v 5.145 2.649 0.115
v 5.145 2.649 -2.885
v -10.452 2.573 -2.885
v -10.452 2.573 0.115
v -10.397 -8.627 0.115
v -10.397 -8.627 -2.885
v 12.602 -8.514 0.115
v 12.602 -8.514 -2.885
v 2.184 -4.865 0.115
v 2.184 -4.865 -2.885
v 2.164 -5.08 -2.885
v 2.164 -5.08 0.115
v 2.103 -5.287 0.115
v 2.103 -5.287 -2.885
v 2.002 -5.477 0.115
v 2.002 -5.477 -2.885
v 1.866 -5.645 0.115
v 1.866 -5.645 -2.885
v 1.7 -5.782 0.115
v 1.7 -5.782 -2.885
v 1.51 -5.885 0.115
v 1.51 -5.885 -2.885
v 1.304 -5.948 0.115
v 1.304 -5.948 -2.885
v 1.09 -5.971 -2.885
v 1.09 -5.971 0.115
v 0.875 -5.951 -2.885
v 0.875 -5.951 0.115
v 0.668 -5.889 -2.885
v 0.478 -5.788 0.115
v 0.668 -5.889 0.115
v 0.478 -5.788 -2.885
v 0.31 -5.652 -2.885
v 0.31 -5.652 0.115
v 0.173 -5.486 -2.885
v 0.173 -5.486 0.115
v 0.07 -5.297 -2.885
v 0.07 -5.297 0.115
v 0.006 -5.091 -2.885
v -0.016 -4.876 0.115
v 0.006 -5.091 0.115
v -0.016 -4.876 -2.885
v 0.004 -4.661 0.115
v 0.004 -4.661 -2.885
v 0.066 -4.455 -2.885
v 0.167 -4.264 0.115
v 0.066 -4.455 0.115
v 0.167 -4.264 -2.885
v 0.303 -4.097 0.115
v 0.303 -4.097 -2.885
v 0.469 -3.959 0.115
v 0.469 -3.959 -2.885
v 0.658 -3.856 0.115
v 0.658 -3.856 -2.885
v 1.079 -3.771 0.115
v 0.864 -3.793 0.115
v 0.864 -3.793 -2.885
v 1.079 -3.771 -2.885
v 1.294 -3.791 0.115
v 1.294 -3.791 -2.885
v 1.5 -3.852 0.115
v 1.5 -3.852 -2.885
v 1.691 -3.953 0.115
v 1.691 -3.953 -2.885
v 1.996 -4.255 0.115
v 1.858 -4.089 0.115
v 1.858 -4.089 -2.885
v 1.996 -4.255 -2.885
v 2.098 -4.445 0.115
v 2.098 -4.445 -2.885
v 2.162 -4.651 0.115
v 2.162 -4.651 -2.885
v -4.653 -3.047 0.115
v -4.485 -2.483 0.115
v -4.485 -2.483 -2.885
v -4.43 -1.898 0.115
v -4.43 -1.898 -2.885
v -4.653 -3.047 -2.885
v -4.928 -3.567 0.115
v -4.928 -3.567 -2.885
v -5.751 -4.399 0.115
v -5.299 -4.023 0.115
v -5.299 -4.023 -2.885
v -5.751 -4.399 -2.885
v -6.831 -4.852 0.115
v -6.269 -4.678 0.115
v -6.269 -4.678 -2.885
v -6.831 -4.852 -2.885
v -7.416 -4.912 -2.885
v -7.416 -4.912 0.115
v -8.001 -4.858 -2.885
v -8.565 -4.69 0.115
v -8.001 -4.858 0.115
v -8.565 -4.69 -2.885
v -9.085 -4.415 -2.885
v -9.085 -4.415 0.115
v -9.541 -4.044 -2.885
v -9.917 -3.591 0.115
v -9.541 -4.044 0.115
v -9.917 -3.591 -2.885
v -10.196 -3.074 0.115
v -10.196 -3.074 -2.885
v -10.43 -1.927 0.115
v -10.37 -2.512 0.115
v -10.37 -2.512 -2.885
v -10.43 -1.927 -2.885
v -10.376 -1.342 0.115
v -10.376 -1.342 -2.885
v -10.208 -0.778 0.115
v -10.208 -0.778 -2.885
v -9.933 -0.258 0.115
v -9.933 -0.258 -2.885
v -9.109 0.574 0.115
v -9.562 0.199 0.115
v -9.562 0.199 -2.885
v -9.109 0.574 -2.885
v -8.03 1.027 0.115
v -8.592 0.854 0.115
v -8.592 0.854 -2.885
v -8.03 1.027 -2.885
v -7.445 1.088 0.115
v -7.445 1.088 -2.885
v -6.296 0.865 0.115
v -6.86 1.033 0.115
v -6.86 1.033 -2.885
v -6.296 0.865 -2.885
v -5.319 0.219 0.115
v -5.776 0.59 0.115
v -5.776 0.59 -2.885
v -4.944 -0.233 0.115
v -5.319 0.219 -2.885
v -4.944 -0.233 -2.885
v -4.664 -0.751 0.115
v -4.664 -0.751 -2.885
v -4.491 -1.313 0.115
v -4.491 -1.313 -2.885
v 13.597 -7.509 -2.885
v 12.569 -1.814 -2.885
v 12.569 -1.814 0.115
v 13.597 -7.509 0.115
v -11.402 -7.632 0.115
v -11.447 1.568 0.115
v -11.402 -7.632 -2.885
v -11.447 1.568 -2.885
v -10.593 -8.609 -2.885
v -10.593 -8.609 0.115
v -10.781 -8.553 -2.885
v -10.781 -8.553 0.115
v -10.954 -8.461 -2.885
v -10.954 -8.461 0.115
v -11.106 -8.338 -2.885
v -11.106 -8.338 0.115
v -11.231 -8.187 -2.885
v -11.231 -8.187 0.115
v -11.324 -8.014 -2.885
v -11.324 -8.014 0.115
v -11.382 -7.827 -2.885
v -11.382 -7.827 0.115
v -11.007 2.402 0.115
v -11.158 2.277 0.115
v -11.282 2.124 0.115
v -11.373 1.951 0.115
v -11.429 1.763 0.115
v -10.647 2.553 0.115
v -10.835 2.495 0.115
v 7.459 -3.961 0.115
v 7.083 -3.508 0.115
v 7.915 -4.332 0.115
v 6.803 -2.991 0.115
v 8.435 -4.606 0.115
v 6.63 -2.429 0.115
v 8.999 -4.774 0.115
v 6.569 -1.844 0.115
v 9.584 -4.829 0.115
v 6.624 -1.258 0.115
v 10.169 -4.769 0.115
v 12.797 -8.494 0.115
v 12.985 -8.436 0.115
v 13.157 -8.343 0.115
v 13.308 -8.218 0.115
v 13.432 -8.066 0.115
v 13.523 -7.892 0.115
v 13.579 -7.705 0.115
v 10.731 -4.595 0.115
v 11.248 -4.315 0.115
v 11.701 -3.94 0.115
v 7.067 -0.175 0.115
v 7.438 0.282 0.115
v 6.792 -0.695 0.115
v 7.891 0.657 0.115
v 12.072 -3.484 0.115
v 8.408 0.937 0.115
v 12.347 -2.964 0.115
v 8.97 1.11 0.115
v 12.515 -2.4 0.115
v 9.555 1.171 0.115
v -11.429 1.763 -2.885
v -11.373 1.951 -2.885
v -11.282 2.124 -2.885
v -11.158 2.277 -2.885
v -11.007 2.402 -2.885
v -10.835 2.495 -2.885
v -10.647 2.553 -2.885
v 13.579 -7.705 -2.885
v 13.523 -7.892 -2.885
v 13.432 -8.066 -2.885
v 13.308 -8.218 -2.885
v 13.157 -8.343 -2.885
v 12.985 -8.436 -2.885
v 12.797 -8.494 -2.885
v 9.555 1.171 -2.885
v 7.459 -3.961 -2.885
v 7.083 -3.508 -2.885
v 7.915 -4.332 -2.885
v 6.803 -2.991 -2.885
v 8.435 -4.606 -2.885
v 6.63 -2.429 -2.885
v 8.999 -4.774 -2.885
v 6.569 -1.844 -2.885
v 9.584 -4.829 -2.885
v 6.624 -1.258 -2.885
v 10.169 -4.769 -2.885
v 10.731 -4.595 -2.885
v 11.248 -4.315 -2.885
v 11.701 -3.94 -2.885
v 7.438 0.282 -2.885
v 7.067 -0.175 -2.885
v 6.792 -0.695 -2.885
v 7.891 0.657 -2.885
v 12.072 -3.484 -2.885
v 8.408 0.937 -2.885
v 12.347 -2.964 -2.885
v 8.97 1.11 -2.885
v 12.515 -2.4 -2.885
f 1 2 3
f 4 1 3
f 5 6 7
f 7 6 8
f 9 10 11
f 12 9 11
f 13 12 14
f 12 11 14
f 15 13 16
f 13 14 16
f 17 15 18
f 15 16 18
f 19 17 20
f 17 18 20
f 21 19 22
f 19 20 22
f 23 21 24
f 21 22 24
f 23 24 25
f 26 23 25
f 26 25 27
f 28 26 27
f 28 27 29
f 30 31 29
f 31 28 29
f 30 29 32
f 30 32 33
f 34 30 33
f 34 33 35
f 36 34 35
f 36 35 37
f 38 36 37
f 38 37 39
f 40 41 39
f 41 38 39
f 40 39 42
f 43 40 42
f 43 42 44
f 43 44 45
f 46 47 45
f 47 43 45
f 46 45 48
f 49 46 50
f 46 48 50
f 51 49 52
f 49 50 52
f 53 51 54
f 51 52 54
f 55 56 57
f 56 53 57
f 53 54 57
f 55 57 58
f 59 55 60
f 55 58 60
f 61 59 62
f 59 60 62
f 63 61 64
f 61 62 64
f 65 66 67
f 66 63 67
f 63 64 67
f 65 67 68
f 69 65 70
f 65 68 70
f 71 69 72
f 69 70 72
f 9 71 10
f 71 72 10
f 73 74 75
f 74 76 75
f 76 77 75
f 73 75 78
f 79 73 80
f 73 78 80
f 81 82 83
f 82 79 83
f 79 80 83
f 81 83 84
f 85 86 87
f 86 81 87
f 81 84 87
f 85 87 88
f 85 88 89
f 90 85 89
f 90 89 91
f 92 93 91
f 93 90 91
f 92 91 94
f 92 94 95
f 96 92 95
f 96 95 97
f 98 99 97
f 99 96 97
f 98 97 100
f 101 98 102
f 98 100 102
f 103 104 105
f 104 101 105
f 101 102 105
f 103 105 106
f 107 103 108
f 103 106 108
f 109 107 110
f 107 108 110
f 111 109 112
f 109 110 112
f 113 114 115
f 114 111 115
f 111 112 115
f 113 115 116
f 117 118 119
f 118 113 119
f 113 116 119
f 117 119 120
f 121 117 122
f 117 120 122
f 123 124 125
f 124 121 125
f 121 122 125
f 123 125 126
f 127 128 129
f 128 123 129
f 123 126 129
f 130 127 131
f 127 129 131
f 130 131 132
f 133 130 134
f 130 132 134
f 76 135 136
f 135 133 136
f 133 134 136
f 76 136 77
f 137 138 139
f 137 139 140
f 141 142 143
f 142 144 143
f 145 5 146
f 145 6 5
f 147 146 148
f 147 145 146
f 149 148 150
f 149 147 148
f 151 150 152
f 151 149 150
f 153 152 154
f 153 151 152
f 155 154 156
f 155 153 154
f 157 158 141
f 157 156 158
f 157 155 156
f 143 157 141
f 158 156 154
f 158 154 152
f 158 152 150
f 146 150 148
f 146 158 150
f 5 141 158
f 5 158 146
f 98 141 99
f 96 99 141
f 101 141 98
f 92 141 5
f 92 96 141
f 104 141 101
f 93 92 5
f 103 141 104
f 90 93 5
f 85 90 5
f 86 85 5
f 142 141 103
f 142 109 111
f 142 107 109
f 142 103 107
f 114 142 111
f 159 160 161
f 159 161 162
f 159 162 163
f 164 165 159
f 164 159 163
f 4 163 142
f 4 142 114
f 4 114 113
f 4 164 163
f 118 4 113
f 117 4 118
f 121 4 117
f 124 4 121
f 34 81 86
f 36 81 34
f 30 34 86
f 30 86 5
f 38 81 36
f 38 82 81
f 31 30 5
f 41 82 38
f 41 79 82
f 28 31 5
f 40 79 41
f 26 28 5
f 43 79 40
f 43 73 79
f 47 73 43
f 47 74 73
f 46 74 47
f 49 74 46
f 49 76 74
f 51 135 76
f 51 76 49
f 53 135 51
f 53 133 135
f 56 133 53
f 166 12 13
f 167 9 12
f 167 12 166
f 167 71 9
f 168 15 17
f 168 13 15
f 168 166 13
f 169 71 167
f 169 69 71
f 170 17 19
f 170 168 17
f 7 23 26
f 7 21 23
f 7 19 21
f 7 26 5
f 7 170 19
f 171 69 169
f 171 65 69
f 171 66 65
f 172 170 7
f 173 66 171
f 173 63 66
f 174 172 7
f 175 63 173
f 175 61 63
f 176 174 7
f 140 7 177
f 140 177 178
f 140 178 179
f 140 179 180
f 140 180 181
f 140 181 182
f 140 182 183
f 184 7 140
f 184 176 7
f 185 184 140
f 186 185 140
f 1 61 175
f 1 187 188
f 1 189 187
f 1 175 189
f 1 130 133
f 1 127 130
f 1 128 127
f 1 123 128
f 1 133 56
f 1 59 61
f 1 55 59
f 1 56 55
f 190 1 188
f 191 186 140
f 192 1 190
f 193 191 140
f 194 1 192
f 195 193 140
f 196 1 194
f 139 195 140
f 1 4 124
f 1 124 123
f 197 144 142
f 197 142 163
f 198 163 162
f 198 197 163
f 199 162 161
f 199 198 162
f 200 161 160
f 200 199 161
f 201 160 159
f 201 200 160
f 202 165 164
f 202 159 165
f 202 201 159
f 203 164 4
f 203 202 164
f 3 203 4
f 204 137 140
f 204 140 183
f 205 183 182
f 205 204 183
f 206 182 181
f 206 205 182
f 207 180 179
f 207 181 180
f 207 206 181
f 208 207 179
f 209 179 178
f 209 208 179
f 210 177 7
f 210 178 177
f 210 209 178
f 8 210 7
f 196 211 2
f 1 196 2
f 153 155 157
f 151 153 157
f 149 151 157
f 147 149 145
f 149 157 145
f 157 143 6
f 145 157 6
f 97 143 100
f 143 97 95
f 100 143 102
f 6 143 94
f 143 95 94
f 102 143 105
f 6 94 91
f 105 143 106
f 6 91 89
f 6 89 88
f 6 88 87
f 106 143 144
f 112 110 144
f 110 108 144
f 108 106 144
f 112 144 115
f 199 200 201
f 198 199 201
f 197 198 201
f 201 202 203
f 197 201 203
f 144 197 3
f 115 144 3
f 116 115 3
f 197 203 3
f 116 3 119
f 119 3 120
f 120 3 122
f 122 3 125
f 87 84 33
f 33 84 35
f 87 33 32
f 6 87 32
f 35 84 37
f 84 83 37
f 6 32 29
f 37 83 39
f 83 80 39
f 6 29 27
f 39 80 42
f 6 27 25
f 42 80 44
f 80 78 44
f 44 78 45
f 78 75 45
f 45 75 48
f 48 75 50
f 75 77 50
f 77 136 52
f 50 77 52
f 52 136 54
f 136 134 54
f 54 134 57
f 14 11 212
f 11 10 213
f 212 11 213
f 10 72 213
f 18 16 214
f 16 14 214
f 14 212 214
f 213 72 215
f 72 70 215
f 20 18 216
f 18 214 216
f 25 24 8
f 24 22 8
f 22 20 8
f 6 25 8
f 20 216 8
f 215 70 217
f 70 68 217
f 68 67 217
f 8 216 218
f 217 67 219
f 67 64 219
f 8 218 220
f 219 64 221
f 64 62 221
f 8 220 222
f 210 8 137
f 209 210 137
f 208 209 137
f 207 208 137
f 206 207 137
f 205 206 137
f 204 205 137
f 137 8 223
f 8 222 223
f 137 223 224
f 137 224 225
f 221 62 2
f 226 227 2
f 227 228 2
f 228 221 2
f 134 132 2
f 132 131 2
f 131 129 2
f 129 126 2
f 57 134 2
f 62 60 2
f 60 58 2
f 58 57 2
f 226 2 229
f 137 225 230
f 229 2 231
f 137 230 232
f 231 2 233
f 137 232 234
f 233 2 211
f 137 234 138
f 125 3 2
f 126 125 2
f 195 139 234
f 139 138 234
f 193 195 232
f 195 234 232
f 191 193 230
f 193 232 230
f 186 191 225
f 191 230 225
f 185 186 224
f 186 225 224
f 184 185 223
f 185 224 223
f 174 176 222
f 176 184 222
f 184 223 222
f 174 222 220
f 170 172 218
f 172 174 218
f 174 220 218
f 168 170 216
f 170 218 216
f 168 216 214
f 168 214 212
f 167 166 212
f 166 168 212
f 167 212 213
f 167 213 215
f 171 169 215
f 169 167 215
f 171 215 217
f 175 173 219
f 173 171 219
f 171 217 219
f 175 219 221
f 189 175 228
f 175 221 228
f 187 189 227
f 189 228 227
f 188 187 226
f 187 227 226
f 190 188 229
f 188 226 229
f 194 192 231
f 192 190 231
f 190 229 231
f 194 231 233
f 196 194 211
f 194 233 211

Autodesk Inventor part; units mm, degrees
ref_plane "YZ Plane" through (0, 0, 0) normal (1, 0, 0) x (0, 1, 0)
ref_plane "XZ Plane" through (0, 0, 0) normal (0, 1, 0) x (-1, 0, 0)
ref_plane "XY Plane" through (0, 0, 0) normal (0, 0, 1) x (1, 0, 0)
ref_plane "Work Plane1" through (1.0737, -2.7207, -1.3848) normal (0, 0, 1) x (1, 0.0049, 0)
sketch "Sketch1" plane through (1.0737, -2.7207, -1.3848) normal (0, 0, 1) x (1, 0.0049, 0)
  line L0 (-12.5, -4.85) -> (-12.5, 4.35) projected
  line L1 (12.5, 4.35) -> (12.5, -4.85) projected
  line L2 (11.5, -5.85) -> (-11.5, -5.85) projected
  circle A0 centre (8.5, 0.85) radius 3 projected
  circle A1 centre (-8.5, 0.85) radius 3 projected
  circle A2 centre (0, -2.15) radius 1.1
  line L3 (4.0694, -5.85) -> (-4.0694, -5.85)
  circle A3 centre (0, -2.15) radius 1.1 projected
  line L4 (-11.5, 5.35) -> (11.5, 5.35) projected
  arc A4 (-12.5, -4.85) -> (-11.5, -5.85) centre (-11.5, -4.85) ccw projected
  arc A5 (-11.5, 5.35) -> (-12.5, 4.35) centre (-11.5, 4.35) ccw projected
  arc A6 (12.5, 4.35) -> (11.5, 5.35) centre (11.5, 4.35) ccw projected
  arc A7 (11.5, -5.85) -> (12.5, -4.85) centre (11.5, -4.85) ccw projected
  point P0 (-1.0602, 2.726)
  dimension "d0" = 2.2
extrude "Extrusion1" add sketch "Sketch1" along normal mid plane 4
sketch "Sketch2" plane through (1.0737, -2.7207, 0.6152) normal (0, 0, 1) x (1, 0.0049, 0)
  line L0 (-12.5, 4.35) -> (-12.5, -4.85) projected
  line L1 (-11.5, -5.85) -> (11.5, -5.85) projected
  line L2 (12.5, -4.85) -> (12.5, 4.35) projected
  circle A0 centre (8.5, 0.85) radius 3 projected
  circle A1 centre (-8.5, 0.85) radius 3 projected
  line L3 (11.5, 0.85) -> (12.5, 0.85)
  line L4 (12.5, -4.85) -> (12.5, 4.35) projected
  circle A2 centre (8.5, 0.85) radius 3 projected
  line L5 (8.5, 3.85) -> (0.045, 5.85)
  line L6 (12.5, 5.85) -> (-12.5, 5.85) projected
  circle A3 centre (0, -2.15) radius 1.1 projected
  line L7 (11.5, 5.35) -> (-11.5, 5.35) projected
  arc A4 (-12.5, -4.85) -> (-11.5, -5.85) centre (-11.5, -4.85) ccw projected
  arc A5 (11.5, -5.85) -> (12.5, -4.85) centre (11.5, -4.85) ccw projected
  arc A6 (12.5, 4.35) -> (11.5, 5.35) centre (11.5, 4.35) ccw projected
  arc A7 (-11.5, 5.35) -> (-12.5, 4.35) centre (-11.5, 4.35) ccw projected
  point P0 (-1.0602, 2.726)
  point P1 (-12.5, 5.85)
  point P2 (8.5, 3.85)
  point P3 (12.5, 0.85)
extrude "Extrusion2" [suppressed]
sketch "Sketch3" plane through (1.0737, -2.7207, 0.6152) normal (0, 0, 1) x (1, 0.0049, 0)
  line L0 (-12.5, 4.35) -> (-12.5, -4.85) projected
  line L1 (-11.5, -5.85) -> (11.5, -5.85) projected
  line L2 (12.5, -4.85) -> (12.5, 4.35) projected
  circle A0 centre (8.5, 0.85) radius 3 projected
  circle A1 centre (-8.5, 0.85) radius 3 projected
  circle A2 centre (0, -2.15) radius 1.1 projected
  line L3 (-12.5, 4.35) -> (-12.5, -4.85) projected
  line L4 (-12.5, 5.85) -> (-9.6209, 5.85)
  line L5 (-9.6209, 5.85) -> (-9.6209, 5.35)
  line L6 (-9.6209, 5.35) -> (-12.5, 5.35)
  line L7 (-12.5, 5.35) -> (-12.5, 5.85)
  line L8 (-12.5, 5.85) -> (7.0362, 5.85)
  line L9 (7.0362, 5.85) -> (7.0362, 5.35)
  line L10 (7.0362, 5.35) -> (-12.5, 5.35)
  line L11 (-12.5, 5.35) -> (-12.5, 5.85)
  arc A3 (12.5, 4.35) -> (11.5, 5.35) centre (11.5, 4.35) ccw projected
  line L12 (11.5, 5.35) -> (-11.5, 5.35) projected
  arc A4 (-11.5, 5.35) -> (-12.5, 4.35) centre (-11.5, 4.35) ccw projected
  arc A5 (-12.5, -4.85) -> (-11.5, -5.85) centre (-11.5, -4.85) ccw projected
  arc A6 (11.5, -5.85) -> (12.5, -4.85) centre (11.5, -4.85) ccw projected
  point P0 (-1.0602, 2.726)
  point P1 (-12.5, -5.85)
  point P2 (-12.5, 5.35)
  point P3 (-9.6209, 5.35)
  point P4 (-11.5, 5.35)
  point P5 (-12.5, 5.35)
  point P6 (-9.6209, 5.35)
  point P7 (7.0362, 5.35)
  point P8 (7.0362, 5.35)
  dimension "d5" = 0.5
extrude "Extrusion3" cut sketch "Sketch3" against normal blind 10 contours A4 L6 L10 L12 A3 L2 A6 L1 A5 L0 | L6 L7 L4 L5 | L5 L8 L9 L10 | A1 | A2
sketch "Sketch4" plane through (1.0737, -2.7207, -1.3848) normal (0, 0, 1) x (1, 0.0049, 0)
  arc A0 (-12.5, -4.85) -> (-11.5, -5.85) centre (-11.5, -4.85) ccw projected
  line L0 (-11.5, -5.85) -> (11.5, -5.85) projected
  arc A1 (11.5, -5.85) -> (12.5, -4.85) centre (11.5, -4.85) ccw projected
  line L1 (12.5, -4.85) -> (12.5, 4.35) projected
  arc A2 (12.5, 4.35) -> (11.5, 5.35) centre (11.5, 4.35) ccw projected
  line L2 (11.5, 5.35) -> (-11.5, 5.35) projected
  arc A3 (-11.5, 5.35) -> (-12.5, 4.35) centre (-11.5, 4.35) ccw projected
  line L3 (-12.5, 4.35) -> (-12.5, -4.85) projected
  circle A4 centre (0, -2.15) radius 1.1 projected
  circle A5 centre (8.5, 0.85) radius 3 projected
  circle A6 centre (-8.5, 0.85) radius 3 projected
  line L4 (8.5, 3.85) -> (4.0971, 5.35)
  line L5 (11.5, 0.85) -> (12.5, -4.85)
  point P0 (-1.0602, 2.726)
extrude "Extrusion4" add sketch "Sketch4" along normal mid plane 3 contours L3 A3 L2 L4 A5 L5 A1 L0 A0
properties part number "srodek"
